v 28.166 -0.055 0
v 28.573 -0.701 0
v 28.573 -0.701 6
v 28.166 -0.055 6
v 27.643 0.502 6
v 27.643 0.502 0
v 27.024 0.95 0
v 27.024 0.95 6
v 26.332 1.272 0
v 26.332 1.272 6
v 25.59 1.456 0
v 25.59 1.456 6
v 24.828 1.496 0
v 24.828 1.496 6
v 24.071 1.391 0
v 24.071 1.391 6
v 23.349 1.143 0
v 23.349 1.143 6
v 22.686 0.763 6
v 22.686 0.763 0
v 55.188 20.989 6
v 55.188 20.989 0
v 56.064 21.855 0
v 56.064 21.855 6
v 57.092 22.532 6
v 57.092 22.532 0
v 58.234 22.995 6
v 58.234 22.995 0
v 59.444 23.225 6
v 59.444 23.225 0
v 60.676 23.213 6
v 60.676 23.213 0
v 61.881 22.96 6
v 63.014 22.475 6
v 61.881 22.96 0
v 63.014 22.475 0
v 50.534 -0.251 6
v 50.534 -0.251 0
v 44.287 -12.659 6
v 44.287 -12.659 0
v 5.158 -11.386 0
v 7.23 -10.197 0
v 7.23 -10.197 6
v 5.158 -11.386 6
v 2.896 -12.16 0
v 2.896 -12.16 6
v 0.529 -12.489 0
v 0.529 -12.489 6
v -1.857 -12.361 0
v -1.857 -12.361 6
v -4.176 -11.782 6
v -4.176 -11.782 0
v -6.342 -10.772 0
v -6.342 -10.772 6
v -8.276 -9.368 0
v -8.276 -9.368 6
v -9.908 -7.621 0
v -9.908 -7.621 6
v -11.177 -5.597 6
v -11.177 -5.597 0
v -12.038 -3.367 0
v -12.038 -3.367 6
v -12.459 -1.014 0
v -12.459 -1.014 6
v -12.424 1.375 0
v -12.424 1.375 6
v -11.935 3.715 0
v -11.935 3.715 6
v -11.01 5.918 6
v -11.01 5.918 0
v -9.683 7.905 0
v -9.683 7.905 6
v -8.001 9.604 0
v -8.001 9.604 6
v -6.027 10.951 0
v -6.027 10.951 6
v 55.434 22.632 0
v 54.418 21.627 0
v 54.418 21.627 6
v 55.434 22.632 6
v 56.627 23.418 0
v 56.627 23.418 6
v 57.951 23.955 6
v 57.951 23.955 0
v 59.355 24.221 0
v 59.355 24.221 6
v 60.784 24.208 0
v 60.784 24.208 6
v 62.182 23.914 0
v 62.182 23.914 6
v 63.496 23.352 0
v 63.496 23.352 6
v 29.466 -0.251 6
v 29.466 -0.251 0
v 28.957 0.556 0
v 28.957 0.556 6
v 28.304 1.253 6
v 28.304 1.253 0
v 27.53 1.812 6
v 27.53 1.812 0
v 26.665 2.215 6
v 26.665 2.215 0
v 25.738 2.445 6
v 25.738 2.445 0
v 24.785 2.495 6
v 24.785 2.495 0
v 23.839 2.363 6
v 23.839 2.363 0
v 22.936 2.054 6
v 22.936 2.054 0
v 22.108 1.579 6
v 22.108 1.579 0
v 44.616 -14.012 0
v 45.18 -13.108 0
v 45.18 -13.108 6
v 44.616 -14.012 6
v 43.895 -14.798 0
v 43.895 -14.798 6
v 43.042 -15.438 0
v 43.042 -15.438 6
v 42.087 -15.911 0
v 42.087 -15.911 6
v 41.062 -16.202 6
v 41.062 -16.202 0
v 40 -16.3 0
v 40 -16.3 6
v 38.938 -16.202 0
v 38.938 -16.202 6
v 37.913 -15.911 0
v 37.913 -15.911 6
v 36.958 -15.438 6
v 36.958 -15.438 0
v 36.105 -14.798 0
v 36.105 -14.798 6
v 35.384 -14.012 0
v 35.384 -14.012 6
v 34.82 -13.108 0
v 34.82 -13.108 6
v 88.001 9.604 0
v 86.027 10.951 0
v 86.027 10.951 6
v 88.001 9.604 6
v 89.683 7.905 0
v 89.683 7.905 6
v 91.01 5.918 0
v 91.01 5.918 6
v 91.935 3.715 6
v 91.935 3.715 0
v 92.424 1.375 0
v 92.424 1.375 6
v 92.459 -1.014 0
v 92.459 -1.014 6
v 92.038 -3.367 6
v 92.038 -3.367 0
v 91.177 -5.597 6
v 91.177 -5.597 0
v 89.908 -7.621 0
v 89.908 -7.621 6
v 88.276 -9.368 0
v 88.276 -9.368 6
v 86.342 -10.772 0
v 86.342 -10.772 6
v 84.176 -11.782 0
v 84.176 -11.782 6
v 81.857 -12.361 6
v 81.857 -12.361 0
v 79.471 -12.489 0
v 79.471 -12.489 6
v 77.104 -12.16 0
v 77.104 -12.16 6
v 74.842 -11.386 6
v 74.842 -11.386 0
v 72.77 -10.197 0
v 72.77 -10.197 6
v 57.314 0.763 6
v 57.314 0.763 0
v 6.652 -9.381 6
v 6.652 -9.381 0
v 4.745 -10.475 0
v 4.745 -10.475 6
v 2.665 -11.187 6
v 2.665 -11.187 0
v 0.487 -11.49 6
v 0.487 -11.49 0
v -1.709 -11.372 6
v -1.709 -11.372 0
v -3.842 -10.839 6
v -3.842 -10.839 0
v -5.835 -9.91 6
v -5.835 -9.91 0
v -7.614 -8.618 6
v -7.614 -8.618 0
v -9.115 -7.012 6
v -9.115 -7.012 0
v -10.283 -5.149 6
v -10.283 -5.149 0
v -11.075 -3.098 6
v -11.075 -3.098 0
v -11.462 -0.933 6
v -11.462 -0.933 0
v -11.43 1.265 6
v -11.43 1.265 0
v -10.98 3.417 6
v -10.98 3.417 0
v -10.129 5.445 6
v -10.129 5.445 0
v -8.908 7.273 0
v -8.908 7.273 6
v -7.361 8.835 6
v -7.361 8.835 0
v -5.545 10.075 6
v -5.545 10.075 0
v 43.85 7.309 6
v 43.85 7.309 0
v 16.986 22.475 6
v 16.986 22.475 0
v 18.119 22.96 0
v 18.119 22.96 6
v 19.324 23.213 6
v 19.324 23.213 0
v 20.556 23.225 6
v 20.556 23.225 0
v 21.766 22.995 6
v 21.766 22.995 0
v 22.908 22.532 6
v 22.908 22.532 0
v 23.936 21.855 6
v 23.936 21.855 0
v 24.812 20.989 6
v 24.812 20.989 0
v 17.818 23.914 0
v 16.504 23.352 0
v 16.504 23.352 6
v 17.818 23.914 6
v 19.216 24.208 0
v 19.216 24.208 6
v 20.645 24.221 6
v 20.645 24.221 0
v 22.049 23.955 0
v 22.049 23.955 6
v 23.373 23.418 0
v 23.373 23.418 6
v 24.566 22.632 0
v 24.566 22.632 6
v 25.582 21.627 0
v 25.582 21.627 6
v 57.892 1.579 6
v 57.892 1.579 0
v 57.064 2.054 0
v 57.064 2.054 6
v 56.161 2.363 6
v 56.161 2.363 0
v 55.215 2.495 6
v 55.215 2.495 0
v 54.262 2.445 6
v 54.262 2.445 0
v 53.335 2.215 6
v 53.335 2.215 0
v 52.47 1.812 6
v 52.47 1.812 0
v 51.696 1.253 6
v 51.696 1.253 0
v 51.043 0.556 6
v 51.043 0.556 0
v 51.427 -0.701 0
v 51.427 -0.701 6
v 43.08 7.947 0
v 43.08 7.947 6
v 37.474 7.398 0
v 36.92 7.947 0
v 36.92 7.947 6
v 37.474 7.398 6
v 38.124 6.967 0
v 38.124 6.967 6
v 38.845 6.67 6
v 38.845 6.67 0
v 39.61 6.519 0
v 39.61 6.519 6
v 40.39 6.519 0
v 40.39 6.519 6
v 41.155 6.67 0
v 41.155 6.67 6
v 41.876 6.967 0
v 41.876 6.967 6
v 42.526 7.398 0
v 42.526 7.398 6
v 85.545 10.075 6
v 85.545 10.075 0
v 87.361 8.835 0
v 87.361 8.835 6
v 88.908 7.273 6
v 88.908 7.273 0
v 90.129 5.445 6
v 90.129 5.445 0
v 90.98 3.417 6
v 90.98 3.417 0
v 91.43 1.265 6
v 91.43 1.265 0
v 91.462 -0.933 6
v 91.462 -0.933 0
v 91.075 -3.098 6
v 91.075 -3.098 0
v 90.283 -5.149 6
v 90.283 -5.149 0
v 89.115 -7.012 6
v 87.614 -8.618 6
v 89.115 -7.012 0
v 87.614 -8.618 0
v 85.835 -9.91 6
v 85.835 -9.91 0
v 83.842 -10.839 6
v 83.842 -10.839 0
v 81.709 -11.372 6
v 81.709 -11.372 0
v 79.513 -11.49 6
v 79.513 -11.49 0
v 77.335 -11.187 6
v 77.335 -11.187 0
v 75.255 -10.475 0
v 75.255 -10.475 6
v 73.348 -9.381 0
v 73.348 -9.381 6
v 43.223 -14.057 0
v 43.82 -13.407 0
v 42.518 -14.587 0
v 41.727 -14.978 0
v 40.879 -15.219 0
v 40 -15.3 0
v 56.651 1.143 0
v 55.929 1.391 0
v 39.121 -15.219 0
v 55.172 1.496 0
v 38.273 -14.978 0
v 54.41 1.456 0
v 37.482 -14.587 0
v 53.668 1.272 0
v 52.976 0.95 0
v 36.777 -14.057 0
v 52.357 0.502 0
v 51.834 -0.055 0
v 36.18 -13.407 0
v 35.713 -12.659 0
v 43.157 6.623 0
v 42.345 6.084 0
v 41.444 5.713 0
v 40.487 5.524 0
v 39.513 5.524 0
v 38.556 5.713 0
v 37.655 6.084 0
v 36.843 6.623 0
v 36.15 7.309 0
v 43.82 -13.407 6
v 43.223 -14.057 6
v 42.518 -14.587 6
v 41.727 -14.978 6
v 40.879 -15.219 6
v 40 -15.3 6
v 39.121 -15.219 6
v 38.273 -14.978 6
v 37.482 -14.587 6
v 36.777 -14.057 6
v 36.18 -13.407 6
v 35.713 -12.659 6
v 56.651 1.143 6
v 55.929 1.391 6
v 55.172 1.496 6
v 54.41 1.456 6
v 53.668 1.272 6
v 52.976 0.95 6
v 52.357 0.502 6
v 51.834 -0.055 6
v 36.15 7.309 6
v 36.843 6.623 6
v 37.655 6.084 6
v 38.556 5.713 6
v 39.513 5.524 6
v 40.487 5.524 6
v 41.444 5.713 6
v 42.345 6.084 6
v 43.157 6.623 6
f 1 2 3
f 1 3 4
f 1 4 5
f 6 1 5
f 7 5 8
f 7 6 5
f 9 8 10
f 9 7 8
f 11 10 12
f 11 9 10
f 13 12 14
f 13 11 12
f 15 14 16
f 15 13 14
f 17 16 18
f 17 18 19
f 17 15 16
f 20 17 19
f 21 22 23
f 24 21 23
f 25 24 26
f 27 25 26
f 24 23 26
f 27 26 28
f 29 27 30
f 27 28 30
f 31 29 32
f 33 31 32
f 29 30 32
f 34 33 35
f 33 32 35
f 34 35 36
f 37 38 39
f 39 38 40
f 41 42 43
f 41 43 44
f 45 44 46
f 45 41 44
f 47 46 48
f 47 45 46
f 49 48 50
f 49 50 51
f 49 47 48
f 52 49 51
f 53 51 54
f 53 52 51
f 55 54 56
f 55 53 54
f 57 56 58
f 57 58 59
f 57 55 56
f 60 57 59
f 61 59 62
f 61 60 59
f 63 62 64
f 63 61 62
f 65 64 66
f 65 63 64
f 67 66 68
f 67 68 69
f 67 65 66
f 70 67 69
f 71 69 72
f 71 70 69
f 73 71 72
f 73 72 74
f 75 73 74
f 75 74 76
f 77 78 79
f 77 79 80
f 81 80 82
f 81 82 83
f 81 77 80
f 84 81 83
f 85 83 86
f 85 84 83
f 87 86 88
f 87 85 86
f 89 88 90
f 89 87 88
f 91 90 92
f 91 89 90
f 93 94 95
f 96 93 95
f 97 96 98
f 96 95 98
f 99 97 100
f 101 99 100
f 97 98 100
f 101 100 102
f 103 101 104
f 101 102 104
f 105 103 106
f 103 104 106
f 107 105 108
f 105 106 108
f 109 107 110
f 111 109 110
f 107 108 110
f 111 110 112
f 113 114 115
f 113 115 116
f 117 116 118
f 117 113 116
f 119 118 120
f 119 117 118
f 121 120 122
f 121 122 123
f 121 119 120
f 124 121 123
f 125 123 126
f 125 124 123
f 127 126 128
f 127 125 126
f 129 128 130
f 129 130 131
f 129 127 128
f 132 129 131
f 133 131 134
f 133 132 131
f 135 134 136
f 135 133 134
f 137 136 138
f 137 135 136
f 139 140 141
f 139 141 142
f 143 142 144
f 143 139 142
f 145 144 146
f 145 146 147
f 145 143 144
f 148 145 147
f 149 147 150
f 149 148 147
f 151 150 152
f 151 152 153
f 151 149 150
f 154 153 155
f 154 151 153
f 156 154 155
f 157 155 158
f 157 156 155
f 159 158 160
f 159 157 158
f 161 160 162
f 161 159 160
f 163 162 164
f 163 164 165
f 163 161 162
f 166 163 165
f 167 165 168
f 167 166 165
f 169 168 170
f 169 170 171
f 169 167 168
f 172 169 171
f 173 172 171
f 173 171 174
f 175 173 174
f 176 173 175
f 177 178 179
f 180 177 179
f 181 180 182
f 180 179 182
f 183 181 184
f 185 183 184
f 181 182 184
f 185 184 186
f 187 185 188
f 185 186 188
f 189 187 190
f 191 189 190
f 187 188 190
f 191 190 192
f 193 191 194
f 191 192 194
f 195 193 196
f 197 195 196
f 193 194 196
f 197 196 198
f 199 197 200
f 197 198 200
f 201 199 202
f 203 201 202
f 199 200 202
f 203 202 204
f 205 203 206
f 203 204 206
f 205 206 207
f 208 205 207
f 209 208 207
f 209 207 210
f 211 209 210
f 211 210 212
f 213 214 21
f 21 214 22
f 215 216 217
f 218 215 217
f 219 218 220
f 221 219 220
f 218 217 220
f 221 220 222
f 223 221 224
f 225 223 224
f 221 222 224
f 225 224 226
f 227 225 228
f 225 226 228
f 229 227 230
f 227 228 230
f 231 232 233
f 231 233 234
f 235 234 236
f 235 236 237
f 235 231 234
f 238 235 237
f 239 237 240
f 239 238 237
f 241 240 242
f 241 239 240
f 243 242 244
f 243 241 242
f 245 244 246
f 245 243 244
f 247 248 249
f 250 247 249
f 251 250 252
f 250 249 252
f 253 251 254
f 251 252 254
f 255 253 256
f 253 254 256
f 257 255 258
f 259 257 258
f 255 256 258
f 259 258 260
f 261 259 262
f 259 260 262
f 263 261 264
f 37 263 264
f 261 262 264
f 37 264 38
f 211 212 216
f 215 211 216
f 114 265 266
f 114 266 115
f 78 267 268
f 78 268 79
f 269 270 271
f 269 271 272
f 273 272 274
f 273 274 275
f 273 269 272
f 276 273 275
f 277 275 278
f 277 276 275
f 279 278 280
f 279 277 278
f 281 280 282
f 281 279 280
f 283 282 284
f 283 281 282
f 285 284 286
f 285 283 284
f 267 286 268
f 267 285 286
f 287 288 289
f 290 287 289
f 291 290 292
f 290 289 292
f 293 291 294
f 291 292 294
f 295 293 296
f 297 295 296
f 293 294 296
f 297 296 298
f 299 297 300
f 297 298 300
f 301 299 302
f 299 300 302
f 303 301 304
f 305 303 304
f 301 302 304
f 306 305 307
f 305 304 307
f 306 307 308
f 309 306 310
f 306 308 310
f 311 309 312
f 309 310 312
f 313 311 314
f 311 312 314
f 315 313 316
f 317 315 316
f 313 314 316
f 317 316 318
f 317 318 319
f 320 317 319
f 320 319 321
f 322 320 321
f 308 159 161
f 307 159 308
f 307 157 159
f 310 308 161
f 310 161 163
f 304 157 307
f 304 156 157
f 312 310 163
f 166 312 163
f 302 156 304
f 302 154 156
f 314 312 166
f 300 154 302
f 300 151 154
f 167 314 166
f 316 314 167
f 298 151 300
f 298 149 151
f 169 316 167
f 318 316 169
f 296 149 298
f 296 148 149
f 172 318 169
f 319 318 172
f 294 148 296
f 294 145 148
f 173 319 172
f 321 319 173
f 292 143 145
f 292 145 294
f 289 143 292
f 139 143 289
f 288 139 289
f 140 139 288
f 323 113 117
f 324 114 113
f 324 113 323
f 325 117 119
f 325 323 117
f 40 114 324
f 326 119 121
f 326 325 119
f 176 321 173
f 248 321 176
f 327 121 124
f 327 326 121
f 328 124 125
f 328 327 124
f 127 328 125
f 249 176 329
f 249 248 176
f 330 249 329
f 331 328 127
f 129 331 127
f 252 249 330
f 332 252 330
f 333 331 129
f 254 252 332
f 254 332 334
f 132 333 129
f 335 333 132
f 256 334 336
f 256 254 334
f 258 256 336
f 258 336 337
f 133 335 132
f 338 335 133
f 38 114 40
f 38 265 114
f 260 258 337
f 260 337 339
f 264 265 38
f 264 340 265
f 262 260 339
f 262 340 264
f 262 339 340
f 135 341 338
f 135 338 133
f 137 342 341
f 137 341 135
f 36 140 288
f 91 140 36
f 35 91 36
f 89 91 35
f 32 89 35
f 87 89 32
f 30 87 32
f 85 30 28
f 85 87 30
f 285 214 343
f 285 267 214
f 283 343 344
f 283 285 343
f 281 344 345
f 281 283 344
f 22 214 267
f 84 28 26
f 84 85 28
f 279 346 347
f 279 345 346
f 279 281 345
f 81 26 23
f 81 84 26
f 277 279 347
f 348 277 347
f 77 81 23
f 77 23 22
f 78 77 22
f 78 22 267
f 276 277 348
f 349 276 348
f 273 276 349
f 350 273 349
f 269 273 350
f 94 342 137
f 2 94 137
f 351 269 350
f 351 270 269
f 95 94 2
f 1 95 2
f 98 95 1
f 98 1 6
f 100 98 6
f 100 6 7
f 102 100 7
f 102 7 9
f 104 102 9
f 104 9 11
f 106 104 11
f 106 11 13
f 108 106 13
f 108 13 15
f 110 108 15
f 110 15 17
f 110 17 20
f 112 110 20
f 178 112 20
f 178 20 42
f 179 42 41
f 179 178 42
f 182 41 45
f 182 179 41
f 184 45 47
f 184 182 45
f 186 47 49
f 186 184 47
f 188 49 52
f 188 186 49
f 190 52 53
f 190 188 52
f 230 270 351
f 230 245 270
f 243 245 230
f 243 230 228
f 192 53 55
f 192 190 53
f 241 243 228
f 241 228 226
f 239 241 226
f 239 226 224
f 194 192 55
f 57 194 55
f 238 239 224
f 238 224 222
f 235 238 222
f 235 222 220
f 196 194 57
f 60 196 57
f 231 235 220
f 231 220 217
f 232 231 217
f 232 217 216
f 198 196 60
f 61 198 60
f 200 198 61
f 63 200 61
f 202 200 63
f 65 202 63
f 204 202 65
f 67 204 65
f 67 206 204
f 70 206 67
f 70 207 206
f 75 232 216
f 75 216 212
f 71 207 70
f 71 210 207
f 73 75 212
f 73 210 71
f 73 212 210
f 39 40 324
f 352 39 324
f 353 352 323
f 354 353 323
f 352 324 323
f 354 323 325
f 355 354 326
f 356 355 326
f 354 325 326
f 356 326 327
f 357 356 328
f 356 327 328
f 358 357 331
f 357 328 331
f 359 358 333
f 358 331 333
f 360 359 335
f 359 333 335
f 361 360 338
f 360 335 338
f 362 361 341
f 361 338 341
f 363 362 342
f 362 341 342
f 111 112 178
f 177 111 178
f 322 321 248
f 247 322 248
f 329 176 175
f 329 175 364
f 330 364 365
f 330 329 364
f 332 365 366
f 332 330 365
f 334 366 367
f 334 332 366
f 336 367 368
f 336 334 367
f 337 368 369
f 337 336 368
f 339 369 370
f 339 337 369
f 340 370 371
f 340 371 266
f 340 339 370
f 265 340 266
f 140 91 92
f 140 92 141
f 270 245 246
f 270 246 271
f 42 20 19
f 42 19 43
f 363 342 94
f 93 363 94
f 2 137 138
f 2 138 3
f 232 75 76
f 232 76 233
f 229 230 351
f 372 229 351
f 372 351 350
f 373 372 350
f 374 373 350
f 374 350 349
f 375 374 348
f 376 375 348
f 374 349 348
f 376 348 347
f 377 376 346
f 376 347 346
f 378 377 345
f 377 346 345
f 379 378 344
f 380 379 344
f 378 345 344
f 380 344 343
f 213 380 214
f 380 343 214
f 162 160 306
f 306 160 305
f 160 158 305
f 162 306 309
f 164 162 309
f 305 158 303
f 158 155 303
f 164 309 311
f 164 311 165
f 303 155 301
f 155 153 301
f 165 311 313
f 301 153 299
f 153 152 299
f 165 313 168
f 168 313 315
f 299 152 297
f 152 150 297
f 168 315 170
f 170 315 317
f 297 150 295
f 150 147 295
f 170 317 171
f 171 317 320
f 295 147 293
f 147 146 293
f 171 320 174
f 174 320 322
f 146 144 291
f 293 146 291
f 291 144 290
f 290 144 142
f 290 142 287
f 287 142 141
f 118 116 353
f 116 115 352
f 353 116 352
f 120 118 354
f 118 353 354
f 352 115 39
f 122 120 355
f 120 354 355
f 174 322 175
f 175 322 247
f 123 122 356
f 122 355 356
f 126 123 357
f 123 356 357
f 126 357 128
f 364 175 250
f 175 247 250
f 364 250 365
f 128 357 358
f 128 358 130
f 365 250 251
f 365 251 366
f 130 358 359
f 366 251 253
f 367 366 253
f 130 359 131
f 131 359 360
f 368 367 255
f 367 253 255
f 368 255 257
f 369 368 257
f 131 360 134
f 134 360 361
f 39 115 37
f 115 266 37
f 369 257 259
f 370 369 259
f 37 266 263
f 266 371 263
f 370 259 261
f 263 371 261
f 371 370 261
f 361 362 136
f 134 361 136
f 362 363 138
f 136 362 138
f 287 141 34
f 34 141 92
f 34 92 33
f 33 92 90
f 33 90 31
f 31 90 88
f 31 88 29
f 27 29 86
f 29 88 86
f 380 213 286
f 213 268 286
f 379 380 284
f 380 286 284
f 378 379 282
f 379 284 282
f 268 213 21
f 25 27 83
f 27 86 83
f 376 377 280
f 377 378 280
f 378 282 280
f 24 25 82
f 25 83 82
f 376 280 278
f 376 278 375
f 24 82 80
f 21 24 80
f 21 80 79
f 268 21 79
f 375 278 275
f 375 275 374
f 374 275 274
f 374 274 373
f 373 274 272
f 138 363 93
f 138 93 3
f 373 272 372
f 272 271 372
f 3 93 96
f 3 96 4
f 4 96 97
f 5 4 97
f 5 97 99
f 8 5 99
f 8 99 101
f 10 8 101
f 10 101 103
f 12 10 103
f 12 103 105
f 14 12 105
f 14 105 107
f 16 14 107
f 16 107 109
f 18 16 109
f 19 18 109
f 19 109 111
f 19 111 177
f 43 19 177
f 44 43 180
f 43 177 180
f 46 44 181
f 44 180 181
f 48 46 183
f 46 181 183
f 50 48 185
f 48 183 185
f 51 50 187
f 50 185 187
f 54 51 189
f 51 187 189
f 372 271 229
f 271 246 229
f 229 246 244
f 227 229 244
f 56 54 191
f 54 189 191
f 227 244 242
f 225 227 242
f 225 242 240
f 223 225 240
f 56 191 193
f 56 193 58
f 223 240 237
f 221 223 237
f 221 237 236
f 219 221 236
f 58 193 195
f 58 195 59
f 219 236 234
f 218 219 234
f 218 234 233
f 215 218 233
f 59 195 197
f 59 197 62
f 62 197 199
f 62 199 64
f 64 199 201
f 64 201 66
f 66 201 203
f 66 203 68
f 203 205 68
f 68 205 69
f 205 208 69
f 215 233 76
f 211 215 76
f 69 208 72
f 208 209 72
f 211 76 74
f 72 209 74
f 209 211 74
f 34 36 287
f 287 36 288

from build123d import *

# Parameters (mm, degrees)
SALIENTE_EXTRUIR1_DEPTH = 6


with BuildPart() as part:
    # Croquis1 → Saliente-Extruir1 (new body)
    with BuildSketch(Plane.XY):
        with BuildLine():
            ThreePointArc((7.230331915, -10.196680852), (-10.590936603, -6.639432345), (-6.027091132, 10.950989567))
            Line((-6.027091132, 10.950989567), (16.504287144, 23.351573949))
            ThreePointArc((16.504287144, 23.351573949), (21.353423494, 24.122551849), (25.581793113, 21.626671118))
            Line((25.581793113, 21.626671118), (36.920390006, 7.947353866))
            ThreePointArc((36.920390006, 7.947353866), (40, 6.5), (43.079609994, 7.947353866))
            Line((43.079609994, 7.947353866), (54.418206887, 21.626671118))
            ThreePointArc((54.418206887, 21.626671118), (58.646576506, 24.122551849), (63.495712856, 23.351573949))
            Line((63.495712856, 23.351573949), (86.027091132, 10.950989567))
            ThreePointArc((86.027091132, 10.950989567), (90.590936603, -6.639432345), (72.769668085, -10.196680852))
            Line((72.769668085, -10.196680852), (57.313706213, 0.762937873))
            ThreePointArc((57.313706213, 0.762937873), (54.034506659, 1.381729332), (51.427293643, -0.701175581))
            Line((51.427293643, -0.701175581), (45.180424217, -13.108295407))
            ThreePointArc((45.180424217, -13.108295407), (40, -16.3), (34.819575783, -13.108295407))
            Line((34.819575783, -13.108295407), (28.572706357, -0.701175581))
            ThreePointArc((28.572706357, -0.701175581), (25.965493341, 1.381729332), (22.686293787, 0.762937873))
            Line((22.686293787, 0.762937873), (7.230331915, -10.196680852))
        make_face()
        with BuildLine():
            Line((35.712752372, -12.658589302), (29.465882946, -0.251469477))
            ThreePointArc((29.465882946, -0.251469477), (26.206866677, 2.352161665), (22.107867234, 1.578672341))
            Line((22.107867234, 1.578672341), (6.651905362, -9.380946384))
            ThreePointArc((6.651905362, -9.380946384), (-9.743661675, -6.108277758), (-5.544923841, 10.074910401))
            Line((-5.544923841, 10.074910401), (16.986454434, 22.475494783))
            ThreePointArc((16.986454434, 22.475494783), (21.166744391, 23.140130905), (24.811890615, 20.988509585))
            Line((24.811890615, 20.988509585), (36.150487508, 7.309192332))
            ThreePointArc((36.150487508, 7.309192332), (40, 5.5), (43.849512492, 7.309192332))
            Line((43.849512492, 7.309192332), (55.188109385, 20.988509585))
            ThreePointArc((55.188109385, 20.988509585), (58.833255609, 23.140130905), (63.013545566, 22.475494783))
            Line((63.013545566, 22.475494783), (85.544923841, 10.074910401))
            ThreePointArc((85.544923841, 10.074910401), (89.743661675, -6.108277758), (73.348094638, -9.380946384))
            Line((73.348094638, -9.380946384), (57.892132766, 1.578672341))
            ThreePointArc((57.892132766, 1.578672341), (53.793133323, 2.352161665), (50.534117054, -0.251469477))
            Line((50.534117054, -0.251469477), (44.287247628, -12.658589302))
            ThreePointArc((44.287247628, -12.658589302), (40, -15.3), (35.712752372, -12.658589302))
        make_face(mode=Mode.SUBTRACT)
    extrude(amount=SALIENTE_EXTRUIR1_DEPTH)


solid = part.part
